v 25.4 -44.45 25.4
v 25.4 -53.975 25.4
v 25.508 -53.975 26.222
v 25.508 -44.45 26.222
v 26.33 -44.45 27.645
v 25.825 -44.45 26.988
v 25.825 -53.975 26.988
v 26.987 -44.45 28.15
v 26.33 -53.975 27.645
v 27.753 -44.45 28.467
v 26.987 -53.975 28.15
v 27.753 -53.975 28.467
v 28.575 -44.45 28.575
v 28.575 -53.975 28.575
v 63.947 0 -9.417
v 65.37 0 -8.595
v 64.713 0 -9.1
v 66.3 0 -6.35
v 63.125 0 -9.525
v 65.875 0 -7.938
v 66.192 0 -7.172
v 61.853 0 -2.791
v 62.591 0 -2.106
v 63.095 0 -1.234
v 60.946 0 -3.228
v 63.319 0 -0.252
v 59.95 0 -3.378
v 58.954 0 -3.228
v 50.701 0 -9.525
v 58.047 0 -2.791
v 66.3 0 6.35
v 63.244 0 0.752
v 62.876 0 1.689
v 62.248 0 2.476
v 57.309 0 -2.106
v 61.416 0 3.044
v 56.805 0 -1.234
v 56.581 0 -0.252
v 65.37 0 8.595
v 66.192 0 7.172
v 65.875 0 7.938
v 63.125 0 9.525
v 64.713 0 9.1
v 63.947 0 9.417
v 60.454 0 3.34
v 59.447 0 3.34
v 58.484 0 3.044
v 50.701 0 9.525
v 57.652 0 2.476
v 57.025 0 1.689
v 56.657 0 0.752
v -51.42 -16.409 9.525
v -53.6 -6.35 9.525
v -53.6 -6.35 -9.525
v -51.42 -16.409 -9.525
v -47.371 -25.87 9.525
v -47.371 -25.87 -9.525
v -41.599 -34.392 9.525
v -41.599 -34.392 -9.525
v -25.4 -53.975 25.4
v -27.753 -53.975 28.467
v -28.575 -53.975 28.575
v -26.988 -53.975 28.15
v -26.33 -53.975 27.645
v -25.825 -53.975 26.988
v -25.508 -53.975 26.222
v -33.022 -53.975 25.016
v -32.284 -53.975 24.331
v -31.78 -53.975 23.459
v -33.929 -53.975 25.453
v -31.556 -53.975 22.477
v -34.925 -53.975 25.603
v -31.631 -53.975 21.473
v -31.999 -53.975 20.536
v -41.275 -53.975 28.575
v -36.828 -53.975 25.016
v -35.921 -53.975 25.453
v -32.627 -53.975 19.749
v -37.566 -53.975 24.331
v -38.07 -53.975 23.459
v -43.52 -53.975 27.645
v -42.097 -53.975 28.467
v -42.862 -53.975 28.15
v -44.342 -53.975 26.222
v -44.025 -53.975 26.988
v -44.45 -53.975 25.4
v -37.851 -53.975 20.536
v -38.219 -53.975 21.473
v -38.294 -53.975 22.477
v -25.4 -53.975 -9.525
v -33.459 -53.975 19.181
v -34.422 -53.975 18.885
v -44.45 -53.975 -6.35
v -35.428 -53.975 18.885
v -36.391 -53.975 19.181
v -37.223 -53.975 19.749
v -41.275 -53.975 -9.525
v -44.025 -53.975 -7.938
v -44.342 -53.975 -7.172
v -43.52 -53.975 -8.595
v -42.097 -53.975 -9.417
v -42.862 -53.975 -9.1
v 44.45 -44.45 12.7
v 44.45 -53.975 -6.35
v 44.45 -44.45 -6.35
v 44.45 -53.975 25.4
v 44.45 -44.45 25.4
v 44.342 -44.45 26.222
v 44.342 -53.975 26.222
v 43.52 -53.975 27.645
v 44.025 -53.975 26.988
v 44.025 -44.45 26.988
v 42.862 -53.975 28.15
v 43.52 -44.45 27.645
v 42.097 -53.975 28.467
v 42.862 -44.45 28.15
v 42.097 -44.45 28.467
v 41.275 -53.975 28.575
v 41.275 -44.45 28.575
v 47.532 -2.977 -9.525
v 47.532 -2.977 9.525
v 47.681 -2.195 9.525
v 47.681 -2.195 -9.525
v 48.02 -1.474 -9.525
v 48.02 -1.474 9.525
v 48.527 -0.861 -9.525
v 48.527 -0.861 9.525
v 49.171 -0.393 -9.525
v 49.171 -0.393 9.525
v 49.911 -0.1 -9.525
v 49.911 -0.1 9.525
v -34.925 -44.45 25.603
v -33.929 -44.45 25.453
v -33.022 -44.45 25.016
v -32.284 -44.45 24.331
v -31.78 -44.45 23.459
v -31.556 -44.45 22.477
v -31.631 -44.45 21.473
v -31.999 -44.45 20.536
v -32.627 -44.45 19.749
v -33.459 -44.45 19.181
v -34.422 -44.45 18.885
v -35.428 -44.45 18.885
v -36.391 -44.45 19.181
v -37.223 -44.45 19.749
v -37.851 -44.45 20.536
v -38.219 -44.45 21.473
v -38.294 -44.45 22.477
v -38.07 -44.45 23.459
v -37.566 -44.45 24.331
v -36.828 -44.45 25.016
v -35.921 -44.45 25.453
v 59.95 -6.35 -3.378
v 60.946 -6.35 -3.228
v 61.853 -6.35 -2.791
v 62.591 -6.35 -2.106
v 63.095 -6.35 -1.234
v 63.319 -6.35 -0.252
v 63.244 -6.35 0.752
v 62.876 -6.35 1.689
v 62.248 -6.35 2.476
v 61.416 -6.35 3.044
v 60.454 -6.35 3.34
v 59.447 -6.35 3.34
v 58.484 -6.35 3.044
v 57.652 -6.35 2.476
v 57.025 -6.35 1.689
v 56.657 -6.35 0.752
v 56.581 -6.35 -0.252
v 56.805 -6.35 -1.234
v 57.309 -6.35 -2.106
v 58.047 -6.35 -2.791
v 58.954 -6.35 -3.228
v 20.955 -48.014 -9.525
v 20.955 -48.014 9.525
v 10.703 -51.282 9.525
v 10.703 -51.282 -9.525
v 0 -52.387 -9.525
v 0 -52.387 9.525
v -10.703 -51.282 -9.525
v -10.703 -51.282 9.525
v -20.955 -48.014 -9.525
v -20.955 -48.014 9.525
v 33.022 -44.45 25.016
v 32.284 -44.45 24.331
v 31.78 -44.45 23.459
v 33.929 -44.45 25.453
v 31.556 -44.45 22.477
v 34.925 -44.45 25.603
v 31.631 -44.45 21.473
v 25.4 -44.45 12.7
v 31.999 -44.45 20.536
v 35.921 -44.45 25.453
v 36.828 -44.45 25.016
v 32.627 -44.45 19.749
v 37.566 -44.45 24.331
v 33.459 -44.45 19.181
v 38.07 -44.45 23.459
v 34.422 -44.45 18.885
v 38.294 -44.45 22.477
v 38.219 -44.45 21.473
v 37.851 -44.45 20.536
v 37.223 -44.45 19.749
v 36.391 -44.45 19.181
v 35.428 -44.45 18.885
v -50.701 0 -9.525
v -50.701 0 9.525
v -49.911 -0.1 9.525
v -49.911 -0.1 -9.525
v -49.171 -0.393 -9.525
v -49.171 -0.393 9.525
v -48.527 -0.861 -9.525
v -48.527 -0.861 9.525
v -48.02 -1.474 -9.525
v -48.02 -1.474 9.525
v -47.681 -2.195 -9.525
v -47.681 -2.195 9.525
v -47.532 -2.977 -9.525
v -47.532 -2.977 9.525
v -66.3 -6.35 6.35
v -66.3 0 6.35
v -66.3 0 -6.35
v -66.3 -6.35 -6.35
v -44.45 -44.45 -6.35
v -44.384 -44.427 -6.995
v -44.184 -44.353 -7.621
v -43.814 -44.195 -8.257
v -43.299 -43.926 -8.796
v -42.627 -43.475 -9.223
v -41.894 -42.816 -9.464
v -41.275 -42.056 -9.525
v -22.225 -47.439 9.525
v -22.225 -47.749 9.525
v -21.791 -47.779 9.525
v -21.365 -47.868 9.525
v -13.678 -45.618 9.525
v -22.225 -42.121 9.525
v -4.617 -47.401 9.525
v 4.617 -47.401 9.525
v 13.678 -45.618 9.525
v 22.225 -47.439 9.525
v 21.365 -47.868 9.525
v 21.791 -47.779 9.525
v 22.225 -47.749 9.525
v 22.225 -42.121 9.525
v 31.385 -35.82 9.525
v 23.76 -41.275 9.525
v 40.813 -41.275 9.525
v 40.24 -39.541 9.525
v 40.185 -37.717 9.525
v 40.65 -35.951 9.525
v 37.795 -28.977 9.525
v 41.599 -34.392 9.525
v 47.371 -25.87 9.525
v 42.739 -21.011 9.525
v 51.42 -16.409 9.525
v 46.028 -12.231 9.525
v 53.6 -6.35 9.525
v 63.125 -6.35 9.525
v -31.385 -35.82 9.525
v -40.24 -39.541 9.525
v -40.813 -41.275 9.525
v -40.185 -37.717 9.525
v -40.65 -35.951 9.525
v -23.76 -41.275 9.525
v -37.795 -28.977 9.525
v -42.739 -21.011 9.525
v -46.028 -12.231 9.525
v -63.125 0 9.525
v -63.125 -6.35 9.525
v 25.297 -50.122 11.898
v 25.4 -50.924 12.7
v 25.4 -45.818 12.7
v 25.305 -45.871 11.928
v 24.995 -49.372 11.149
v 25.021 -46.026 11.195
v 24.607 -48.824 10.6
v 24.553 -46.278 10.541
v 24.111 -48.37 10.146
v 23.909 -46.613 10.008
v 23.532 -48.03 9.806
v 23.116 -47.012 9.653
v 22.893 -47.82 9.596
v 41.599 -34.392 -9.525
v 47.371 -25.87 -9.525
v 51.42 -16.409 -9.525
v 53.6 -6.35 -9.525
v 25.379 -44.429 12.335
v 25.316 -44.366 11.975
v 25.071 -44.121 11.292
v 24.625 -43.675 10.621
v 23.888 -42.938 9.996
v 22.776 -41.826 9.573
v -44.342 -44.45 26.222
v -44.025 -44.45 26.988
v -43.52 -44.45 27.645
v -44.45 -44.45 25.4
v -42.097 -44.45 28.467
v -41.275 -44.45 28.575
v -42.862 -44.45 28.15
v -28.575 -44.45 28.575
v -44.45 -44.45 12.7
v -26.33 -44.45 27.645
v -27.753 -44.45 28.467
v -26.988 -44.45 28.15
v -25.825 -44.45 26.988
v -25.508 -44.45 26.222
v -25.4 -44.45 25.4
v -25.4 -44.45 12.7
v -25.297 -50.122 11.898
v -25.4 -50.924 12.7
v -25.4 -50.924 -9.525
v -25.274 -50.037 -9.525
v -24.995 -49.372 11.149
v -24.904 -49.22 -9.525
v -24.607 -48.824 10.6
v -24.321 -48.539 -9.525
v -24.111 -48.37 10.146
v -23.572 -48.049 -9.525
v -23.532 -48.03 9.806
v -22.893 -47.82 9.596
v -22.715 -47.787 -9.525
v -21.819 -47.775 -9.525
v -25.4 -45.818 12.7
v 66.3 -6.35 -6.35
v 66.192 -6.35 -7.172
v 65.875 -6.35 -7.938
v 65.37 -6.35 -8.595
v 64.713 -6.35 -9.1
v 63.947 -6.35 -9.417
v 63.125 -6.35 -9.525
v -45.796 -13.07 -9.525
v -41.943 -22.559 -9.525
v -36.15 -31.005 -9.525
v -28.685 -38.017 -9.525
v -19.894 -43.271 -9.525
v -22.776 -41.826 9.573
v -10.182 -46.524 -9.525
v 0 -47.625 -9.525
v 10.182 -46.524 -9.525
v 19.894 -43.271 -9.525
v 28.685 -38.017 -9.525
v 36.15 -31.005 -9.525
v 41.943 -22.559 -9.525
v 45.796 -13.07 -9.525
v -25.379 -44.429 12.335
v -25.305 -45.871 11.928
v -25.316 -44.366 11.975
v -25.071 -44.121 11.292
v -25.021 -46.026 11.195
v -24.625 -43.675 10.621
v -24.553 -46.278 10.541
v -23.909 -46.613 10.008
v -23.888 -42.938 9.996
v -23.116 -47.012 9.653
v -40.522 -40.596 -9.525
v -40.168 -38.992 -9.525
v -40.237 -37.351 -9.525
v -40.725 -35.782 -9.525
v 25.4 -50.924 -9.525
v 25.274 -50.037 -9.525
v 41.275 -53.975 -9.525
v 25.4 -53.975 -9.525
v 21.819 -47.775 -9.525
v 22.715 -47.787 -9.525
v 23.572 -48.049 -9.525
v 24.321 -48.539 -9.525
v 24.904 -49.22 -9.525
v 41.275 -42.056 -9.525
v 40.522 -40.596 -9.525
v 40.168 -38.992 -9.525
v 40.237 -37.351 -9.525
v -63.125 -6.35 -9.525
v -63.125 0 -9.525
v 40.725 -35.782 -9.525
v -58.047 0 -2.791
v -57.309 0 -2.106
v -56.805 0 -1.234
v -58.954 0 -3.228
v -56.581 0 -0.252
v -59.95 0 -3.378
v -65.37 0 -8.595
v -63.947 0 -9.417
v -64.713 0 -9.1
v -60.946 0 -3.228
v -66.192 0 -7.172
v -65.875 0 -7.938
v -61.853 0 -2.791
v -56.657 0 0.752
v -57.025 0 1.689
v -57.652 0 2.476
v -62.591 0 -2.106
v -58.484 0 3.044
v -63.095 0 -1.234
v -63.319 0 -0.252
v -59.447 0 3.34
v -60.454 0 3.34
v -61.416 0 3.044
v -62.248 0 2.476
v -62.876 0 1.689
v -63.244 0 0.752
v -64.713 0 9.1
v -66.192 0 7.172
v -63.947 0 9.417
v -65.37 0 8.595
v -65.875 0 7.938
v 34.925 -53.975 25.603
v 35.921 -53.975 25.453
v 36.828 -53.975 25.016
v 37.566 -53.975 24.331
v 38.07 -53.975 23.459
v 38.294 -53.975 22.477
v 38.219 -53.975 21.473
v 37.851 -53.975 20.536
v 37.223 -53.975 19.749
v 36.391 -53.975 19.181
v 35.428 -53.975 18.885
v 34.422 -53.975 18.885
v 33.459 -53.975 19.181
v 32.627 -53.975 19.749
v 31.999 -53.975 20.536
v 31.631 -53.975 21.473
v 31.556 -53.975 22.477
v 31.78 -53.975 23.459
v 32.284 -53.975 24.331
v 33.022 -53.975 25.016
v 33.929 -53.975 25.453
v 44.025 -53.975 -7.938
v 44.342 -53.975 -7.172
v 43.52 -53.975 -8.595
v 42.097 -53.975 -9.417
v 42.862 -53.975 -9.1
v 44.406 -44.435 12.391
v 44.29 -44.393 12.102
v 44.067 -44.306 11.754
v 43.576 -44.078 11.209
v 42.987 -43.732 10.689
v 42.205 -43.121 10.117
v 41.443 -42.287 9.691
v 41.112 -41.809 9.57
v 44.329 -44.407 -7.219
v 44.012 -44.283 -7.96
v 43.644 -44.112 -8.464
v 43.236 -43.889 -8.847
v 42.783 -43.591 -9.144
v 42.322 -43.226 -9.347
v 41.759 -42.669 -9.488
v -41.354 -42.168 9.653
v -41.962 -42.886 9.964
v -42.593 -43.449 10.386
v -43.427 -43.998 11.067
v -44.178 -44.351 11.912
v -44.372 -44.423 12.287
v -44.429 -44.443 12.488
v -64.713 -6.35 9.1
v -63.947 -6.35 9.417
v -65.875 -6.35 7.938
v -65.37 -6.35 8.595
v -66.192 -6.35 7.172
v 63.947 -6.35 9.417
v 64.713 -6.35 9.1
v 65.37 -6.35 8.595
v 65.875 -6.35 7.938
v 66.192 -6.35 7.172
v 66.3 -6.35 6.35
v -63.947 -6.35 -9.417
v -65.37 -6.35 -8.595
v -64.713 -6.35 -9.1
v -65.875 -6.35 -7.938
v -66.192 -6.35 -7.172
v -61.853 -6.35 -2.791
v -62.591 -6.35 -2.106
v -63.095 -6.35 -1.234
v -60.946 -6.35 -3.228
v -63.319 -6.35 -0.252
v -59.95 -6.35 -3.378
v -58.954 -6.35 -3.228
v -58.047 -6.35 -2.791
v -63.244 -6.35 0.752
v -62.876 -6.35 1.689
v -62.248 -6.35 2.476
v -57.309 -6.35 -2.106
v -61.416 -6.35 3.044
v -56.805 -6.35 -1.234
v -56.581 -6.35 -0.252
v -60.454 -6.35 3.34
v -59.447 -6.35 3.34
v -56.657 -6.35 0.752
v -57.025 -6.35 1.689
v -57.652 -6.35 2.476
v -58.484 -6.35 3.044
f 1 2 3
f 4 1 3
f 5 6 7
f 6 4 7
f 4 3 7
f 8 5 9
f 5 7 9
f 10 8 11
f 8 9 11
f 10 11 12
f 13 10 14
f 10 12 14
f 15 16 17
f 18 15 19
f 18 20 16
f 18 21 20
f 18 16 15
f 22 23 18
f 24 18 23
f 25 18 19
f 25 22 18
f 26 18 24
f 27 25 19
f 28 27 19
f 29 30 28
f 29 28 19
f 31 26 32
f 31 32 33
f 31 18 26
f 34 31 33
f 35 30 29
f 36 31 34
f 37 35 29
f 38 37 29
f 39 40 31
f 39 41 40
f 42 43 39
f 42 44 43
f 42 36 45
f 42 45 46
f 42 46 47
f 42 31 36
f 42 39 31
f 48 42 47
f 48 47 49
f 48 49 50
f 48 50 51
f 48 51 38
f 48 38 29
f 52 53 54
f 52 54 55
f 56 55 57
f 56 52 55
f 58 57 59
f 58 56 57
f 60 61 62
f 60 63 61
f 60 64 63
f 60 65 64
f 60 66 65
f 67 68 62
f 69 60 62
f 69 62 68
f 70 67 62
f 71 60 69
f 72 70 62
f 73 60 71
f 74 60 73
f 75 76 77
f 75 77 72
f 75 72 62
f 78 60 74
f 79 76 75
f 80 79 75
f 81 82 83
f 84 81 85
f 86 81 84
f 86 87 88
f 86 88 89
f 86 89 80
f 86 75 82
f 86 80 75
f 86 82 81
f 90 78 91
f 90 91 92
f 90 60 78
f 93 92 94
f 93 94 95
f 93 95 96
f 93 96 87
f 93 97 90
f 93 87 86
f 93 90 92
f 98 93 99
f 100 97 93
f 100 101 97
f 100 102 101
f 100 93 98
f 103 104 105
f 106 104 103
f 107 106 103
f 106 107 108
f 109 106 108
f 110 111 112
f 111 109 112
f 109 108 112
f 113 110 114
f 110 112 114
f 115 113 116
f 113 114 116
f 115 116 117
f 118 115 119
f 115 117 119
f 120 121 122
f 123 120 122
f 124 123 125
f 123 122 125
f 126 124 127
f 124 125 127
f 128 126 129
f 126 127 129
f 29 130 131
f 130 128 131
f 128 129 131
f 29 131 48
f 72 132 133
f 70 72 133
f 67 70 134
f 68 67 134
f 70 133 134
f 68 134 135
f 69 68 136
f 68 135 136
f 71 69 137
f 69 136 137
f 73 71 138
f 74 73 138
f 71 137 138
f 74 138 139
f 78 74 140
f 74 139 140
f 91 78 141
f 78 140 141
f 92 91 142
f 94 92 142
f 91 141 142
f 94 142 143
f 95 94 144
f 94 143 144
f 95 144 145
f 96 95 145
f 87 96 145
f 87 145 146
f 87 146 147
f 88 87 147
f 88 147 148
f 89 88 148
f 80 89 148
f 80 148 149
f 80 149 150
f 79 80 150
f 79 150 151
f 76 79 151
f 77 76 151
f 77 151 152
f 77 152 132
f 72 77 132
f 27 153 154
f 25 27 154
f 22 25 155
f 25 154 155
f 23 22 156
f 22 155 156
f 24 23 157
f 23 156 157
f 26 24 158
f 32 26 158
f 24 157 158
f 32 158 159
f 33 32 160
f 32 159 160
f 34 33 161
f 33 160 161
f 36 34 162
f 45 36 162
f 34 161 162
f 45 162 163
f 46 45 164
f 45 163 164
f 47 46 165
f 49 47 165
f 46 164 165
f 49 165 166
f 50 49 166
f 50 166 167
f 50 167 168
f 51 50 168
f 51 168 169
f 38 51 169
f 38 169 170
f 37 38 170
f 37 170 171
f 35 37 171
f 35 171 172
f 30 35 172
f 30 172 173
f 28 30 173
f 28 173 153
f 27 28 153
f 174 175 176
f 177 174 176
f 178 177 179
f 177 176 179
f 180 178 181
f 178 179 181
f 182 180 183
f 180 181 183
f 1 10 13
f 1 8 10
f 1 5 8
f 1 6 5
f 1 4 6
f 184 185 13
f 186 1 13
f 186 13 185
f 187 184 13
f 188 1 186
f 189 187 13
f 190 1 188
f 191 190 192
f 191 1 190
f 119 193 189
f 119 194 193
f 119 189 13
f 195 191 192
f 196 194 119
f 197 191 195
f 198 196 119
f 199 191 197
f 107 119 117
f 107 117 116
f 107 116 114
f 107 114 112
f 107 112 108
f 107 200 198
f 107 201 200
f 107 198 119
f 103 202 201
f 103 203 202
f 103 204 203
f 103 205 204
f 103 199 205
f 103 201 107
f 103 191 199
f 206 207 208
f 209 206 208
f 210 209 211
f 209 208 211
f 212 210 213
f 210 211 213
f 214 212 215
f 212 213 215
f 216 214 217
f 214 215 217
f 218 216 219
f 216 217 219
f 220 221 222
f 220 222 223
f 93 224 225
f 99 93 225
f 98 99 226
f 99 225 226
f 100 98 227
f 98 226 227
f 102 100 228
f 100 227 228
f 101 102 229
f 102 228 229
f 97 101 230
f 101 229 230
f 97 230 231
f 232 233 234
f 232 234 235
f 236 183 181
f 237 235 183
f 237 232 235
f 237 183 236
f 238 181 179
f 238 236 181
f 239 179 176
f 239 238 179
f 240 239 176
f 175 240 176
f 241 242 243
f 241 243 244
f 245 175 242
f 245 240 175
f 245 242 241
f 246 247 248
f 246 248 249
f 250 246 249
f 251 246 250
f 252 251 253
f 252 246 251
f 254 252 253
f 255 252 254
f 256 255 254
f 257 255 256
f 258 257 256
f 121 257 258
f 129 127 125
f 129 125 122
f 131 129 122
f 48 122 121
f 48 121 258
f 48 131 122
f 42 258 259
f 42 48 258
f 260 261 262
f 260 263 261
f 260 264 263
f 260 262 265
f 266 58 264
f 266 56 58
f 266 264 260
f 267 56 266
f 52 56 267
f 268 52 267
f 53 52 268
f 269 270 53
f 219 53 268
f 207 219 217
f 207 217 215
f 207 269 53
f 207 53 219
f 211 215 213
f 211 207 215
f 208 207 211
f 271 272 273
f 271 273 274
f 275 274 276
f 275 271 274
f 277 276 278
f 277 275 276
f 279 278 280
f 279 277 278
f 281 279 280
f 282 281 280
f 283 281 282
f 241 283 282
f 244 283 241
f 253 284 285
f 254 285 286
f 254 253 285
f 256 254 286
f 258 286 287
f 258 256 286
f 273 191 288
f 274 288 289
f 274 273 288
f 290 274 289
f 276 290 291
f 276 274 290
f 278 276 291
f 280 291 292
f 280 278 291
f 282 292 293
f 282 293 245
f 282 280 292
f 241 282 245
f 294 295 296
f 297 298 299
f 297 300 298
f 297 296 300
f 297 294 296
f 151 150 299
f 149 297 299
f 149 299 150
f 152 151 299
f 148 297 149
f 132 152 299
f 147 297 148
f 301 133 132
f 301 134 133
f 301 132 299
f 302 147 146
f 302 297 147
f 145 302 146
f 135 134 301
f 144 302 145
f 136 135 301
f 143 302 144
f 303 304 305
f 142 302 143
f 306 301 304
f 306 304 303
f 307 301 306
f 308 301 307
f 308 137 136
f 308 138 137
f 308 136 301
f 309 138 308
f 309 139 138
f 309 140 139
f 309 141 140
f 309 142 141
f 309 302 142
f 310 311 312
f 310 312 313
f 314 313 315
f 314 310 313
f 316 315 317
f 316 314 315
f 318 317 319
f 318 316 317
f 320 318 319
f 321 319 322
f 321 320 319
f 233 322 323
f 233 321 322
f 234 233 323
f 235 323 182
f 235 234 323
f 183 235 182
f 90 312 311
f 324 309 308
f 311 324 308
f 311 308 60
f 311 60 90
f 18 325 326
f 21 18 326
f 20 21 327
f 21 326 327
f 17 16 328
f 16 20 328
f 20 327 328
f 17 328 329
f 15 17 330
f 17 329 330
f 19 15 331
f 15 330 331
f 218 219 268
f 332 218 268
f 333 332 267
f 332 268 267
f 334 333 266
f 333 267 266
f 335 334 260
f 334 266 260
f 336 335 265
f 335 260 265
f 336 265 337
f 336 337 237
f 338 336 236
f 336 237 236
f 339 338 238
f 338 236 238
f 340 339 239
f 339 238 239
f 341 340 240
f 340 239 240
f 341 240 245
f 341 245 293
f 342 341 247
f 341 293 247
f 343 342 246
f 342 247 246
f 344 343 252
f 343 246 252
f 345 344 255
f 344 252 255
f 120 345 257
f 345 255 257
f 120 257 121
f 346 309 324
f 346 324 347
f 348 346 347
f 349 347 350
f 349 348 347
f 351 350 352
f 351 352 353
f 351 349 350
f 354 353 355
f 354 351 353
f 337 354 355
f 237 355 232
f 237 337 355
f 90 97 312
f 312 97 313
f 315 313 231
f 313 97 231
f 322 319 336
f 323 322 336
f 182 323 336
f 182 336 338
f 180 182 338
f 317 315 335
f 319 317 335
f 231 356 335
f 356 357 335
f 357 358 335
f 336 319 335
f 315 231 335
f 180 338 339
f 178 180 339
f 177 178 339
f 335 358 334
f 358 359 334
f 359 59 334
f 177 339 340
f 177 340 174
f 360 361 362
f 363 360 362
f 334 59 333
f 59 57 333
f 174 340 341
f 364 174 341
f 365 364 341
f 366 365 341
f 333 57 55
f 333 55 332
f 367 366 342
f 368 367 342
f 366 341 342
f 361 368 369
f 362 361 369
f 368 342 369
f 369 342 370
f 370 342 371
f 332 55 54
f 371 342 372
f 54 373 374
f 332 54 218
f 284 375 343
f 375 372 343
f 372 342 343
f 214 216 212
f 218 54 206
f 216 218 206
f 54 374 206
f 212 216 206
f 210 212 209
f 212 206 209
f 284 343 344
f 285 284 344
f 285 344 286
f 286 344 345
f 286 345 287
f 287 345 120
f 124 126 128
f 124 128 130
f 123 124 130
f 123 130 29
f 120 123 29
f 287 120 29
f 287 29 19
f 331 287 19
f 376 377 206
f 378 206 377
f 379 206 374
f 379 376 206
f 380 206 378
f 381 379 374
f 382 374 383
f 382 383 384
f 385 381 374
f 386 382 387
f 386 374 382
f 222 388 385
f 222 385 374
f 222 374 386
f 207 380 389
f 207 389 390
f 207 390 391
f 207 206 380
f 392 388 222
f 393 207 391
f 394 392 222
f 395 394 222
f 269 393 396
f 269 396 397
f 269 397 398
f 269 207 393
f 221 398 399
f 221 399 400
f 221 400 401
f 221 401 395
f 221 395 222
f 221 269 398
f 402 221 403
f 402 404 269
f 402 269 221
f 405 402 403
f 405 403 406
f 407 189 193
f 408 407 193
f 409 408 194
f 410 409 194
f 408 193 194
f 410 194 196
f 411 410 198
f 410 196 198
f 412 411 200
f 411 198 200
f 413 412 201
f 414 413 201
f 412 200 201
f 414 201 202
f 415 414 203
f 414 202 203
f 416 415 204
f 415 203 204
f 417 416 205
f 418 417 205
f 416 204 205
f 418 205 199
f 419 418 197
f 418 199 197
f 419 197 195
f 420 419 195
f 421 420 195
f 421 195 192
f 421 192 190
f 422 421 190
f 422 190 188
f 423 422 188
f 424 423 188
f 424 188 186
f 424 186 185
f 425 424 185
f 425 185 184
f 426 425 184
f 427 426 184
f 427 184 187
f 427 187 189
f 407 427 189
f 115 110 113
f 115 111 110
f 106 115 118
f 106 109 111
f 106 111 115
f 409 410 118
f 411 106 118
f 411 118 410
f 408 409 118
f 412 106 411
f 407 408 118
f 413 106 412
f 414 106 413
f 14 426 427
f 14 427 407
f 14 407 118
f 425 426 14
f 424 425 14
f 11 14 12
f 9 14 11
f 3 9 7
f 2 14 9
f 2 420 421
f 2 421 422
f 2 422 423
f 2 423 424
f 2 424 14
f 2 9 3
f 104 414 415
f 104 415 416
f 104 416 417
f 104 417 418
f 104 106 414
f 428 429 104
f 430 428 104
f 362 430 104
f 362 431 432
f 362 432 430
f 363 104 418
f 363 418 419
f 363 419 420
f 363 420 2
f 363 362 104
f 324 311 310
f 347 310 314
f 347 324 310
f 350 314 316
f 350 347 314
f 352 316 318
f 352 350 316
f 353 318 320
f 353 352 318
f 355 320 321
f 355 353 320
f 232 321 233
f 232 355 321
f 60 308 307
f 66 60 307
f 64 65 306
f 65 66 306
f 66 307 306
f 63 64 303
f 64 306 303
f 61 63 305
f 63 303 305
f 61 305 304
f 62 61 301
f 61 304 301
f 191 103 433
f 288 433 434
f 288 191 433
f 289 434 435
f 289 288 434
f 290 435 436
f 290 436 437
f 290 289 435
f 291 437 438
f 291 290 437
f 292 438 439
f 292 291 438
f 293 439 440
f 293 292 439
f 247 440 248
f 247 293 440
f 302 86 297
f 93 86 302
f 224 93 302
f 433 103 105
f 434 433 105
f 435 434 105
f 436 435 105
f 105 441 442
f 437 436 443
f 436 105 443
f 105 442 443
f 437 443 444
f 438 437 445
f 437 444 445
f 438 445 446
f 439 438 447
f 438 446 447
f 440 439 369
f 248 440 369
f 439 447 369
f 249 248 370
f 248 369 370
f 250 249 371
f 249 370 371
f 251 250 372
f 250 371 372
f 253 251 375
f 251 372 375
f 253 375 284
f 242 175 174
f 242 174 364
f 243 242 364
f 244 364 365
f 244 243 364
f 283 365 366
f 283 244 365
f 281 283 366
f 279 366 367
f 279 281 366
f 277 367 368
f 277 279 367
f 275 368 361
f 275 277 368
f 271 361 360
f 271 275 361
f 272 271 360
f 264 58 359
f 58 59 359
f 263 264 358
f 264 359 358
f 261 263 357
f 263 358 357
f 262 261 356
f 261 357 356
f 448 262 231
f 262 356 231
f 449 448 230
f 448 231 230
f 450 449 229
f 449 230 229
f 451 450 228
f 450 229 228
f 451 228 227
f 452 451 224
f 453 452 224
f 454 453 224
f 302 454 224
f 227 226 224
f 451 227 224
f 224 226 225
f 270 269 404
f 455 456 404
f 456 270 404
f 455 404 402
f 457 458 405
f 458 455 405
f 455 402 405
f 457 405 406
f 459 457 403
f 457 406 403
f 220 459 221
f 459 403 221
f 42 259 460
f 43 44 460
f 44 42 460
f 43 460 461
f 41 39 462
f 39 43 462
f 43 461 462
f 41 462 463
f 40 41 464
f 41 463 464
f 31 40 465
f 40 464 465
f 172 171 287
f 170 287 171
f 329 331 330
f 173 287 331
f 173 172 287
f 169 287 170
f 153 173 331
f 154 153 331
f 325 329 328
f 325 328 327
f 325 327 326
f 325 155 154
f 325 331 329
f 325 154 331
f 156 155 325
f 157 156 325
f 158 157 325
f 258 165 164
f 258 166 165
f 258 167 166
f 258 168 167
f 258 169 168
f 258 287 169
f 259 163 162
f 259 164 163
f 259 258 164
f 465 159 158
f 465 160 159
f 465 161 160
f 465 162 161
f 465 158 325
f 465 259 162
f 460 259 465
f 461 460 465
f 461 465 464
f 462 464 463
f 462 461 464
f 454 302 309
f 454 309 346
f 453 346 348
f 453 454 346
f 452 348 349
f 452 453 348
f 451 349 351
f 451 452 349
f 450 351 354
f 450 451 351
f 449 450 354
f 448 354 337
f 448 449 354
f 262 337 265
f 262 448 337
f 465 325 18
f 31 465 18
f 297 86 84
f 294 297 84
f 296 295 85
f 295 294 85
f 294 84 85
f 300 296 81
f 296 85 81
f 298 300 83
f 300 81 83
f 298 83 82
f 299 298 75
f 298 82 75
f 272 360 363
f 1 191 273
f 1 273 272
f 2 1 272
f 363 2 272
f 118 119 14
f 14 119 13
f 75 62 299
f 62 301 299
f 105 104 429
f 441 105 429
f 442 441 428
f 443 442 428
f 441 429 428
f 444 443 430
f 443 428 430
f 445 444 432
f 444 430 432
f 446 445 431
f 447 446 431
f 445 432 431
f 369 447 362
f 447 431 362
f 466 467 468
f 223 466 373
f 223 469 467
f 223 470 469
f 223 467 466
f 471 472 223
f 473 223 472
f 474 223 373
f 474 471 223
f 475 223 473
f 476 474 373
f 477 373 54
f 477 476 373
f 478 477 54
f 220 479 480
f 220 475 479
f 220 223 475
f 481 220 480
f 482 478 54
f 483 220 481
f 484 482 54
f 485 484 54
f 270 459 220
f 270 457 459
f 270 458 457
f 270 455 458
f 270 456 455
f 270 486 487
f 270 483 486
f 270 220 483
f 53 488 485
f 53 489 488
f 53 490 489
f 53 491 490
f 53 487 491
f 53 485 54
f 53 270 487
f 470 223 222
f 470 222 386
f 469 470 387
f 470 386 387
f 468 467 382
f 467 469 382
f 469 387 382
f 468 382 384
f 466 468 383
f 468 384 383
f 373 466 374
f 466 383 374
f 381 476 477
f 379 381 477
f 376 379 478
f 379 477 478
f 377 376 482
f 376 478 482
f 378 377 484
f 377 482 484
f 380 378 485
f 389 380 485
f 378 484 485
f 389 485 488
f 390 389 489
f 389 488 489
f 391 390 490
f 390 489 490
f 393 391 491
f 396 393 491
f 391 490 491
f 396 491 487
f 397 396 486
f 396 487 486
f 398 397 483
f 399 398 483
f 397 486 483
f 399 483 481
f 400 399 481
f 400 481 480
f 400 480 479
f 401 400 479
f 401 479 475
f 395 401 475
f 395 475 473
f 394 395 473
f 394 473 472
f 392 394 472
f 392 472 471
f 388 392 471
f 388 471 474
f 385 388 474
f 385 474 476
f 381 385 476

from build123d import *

# Parameters (mm, degrees)
BOSS_EXTRUDE2_DEPTH = 9.525
CUT_EXTRUDE2_REACH  = 84.186
SKETCH5_R           = 3.3782
BOSS_EXTRUDE3_DEPTH = 19.05
CUT_EXTRUDE3_REACH  = 86.782
SKETCH7_R           = 3.3782
CUT_EXTRUDE5_REACH  = 89.589
FILLET3_R           = 6.35
FILLET4_R           = 3.175


with BuildPart() as part:
    # Sketch1 → Boss-Extrude2 (new, symmetric)
    with BuildSketch(Plane.XY):
        with BuildLine():
            Line((-47.62499999999999, 0), (-66.30016907622587, -2.27e-15))
            Line((-66.30016907622587, -2.27e-15), (-66.30016907622587, -6.350000000000002))
            Line((-66.30016907622587, -6.350000000000002), (-53.60016907622586, -6.350000000000002))
            ThreePointArc((-53.60016907622586, -6.350000000000002), (-46.217987777388224, -27.87827524810658), (-30.618591166152626, -44.449999999999996))
            Line((-30.618591166152626, -44.449999999999996), (-44.449999999999996, -44.449999999999996))
            Line((-44.449999999999996, -44.449999999999996), (-44.449999999999996, -53.975))
            Line((-44.449999999999996, -53.975), (44.449999999999996, -53.975))
            Line((44.449999999999996, -53.975), (44.449999999999996, -44.449999999999996))
            Line((44.449999999999996, -44.449999999999996), (30.618591166152626, -44.449999999999996))
            ThreePointArc((30.618591166152626, -44.449999999999996), (46.21798777738823, -27.878275248106572), (53.60016907622586, -6.350000000000002))
            Line((53.60016907622586, -6.350000000000002), (66.30016907622587, -6.350000000000002))
            Line((66.30016907622587, -6.350000000000002), (66.30016907622587, -2.27e-15))
            Line((66.30016907622587, -2.27e-15), (47.62499999999999, 0))
            ThreePointArc((47.62499999999999, 0), (-8.75e-15, -47.62499999999999), (-47.62499999999999, 0))
        make_face()
    extrude(amount=BOSS_EXTRUDE2_DEPTH, both=True)

    # Sketch5 → Cut-Extrude2 (cut, up to next)
    with BuildSketch(Plane.XZ.offset(6.350000000000002), mode=Mode.PRIVATE) as cut_extrude2_sk1:
        with Locations(Location((-59.95016907622586, 0, 0), (0, 0, 270))):
            Circle(SKETCH5_R)
    cut_extrude2_tool1 = extrude(cut_extrude2_sk1.sketch, amount=-CUT_EXTRUDE2_REACH, mode=Mode.PRIVATE) & part.part
    # Sketch5 → Cut-Extrude2 (cut, up to next)
    with BuildSketch(Plane.XZ.offset(6.350000000000002), mode=Mode.PRIVATE) as cut_extrude2_sk2:
        with Locations(Location((59.95016907622586, 0, 0), (0, 0, 270))):
            Circle(SKETCH5_R)
    cut_extrude2_tool2 = extrude(cut_extrude2_sk2.sketch, amount=-CUT_EXTRUDE2_REACH, mode=Mode.PRIVATE) & part.part
    add(cut_extrude2_tool1.solids().sort_by_distance((-59.950169, -6.35, 0))[0], mode=Mode.SUBTRACT)
    add(cut_extrude2_tool2.solids().sort_by_distance((59.950169, -6.35, 0))[0], mode=Mode.SUBTRACT)

    # Sketch6 → Boss-Extrude3 (add)
    with BuildSketch(Plane.XY.offset(9.525)):
        Polygon((-44.449999999999996, -44.449999999999996), (-25.39999999999999, -44.449999999999996), (-25.399999999999995, -53.975), (-44.449999999999996, -53.975), align=None)
        Polygon((44.449999999999996, -53.975), (25.399999999999995, -53.975), (25.39999999999999, -44.449999999999996), (44.449999999999996, -44.449999999999996), align=None)
    extrude(amount=BOSS_EXTRUDE3_DEPTH)

    # Sketch7 → Cut-Extrude3 (cut, up to next)
    with BuildSketch(Plane(origin=(0, -44.449999999999996, 0), x_dir=(1, 0, 0), z_dir=(0, 1, 0)), mode=Mode.PRIVATE) as cut_extrude3_sk1:
        with Locations(Location((-34.925, -22.225, 0), (0, 0, 270))):
            Circle(SKETCH7_R)
    cut_extrude3_tool1 = extrude(cut_extrude3_sk1.sketch, amount=-CUT_EXTRUDE3_REACH, mode=Mode.PRIVATE) & part.part
    # Sketch7 → Cut-Extrude3 (cut, up to next)
    with BuildSketch(Plane(origin=(0, -44.449999999999996, 0), x_dir=(1, 0, 0), z_dir=(0, 1, 0)), mode=Mode.PRIVATE) as cut_extrude3_sk2:
        with Locations(Location((34.925, -22.225, 0), (0, 0, 270))):
            Circle(SKETCH7_R)
    cut_extrude3_tool2 = extrude(cut_extrude3_sk2.sketch, amount=-CUT_EXTRUDE3_REACH, mode=Mode.PRIVATE) & part.part
    add(cut_extrude3_tool1.solids().sort_by_distance((-34.925, -44.45, 22.225))[0], mode=Mode.SUBTRACT)
    add(cut_extrude3_tool2.solids().sort_by_distance((34.925, -44.45, 22.225))[0], mode=Mode.SUBTRACT)

    # Sketch10 → Cut-Extrude5 (cut, up to next)
    with BuildSketch(Plane.XY.offset(9.525), mode=Mode.PRIVATE) as cut_extrude5_sk1:
        with BuildLine():
            Line((-25.4, -45.81801126467626), (-25.399999999999995, -53.975))
            Line((-25.399999999999995, -53.975), (25.399999999999995, -53.975))
            Line((25.399999999999995, -53.975), (25.39999999999999, -45.818011264676265))
            ThreePointArc((25.39999999999999, -45.818011264676265), (3.21e-15, -52.3875), (-25.4, -45.81801126467626))
        make_face()
    cut_extrude5_tool1 = extrude(cut_extrude5_sk1.sketch, amount=-CUT_EXTRUDE5_REACH, mode=Mode.PRIVATE) & part.part
    add(cut_extrude5_tool1.solids().sort_by_distance((-24.885493, -49.896506, 9.525))[0], mode=Mode.SUBTRACT)

    # Fillet3
    # the kernel refuses this fillet: 6.35 mm, written as the material it adds along each edge
    with BuildSketch(Plane(origin=(30.618591166152626, -44.449999999999996, -9.525), x_dir=(1, -5.1e-16, 0), z_dir=(0, 0, 1))) as fillet3_piece_1:
        with BuildLine():
            CenterArc((15.87487517374333, 6.012216339895979), FILLET3_R, 140.4182638704102, 110.80957357767647)
            Line((10.980826085333229, 10.058298830433243), (10.88294510356503, 10.13922048024399))
            ThreePointArc((10.88294510356503, 10.13922048024399), (5.753170572776132, 4.742292284663466), (-0.07204374392036078, 0.10458823529411627))
            Line((-0.07204374392036078, 0.10458823529411627), (7e-17, -0.12700000000000244))
            ThreePointArc((7e-17, -0.12700000000000244), (6.915704416923688, -0.1269999999999989), (13.790539507049452, -0.12024432679791633))
            Line((13.790539507049452, -0.12024432679791633), (13.83140883384737, 0))
        make_face()
    extrude(amount=19.05)
    with BuildSketch(Plane(origin=(-30.618591166152626, -44.45, -9.525), x_dir=(-0.7374035751622449, 0.6754524167829585, 0), z_dir=(0, 0, 1))) as fillet3_piece_2:
        with BuildLine():
            CenterArc((15.767155765377446, 6.2892929785445775), FILLET3_R, 151.26145537711756, 110.80957357767625)
            Line((10.199330323609711, 9.342458524335363), (10.08797381477436, 9.403521835251178))
            ThreePointArc((10.08797381477436, 9.403521835251178), (5.013882704873423, 4.764879516213288), (-0.08578245693143738, 0.0936502540456069))
            Line((-0.08578245693143738, 0.0936502540456069), (0.01751906196152835, -0.1257858595708917))
            ThreePointArc((0.01751906196152835, -0.1257858595708917), (7.445601333650467, 0.3890096823710894), (14.873683605339394, -0.12578585957089045))
            Line((14.873683605339394, -0.12578585957089045), (14.89120266730092, 1.6e-16))
        make_face()
    extrude(amount=19.05)

    # Fillet4
    # the kernel refuses this fillet: 3.175 mm, written as the material it adds along each edge
    with BuildSketch(Plane(origin=(-44.45000000000031, -44.44999999999735, 9.525), x_dir=(1.3875e-13, 1, -5.6e-16), z_dir=(1, -1.3875e-13, 0))) as fillet4_piece_1_section:
        with BuildLine():
            CenterArc((FILLET4_R, FILLET4_R), FILLET4_R, 180.00000000000003, 90)
            Line((-8.88e-15, FILLET4_R), (0, 0))
            Line((0, 0), (FILLET4_R, 0))
        make_face()
    fillet4_piece_1 = extrude(amount=19.050000000000317, mode=Mode.PRIVATE)
    fillet4_piece_1 = fillet4_piece_1 - Plane(origin=(-46.493466339895136, -38.43778366010152, 10.266773155518875), x_dir=(-0.7374035751621124, 0.6754524167831031, 0), z_dir=(0, 0, -1)) * Cylinder(6.35, 51, mode=Mode.PRIVATE)
    add(fillet4_piece_1)
    with BuildSketch(Plane(origin=(25.39999999999999, -44.449999999999996, 9.525), x_dir=(-7.5e-16, 1, -5.6e-16), z_dir=(1, 7.5e-16, 0))) as fillet4_piece_2_section:
        with BuildLine():
            CenterArc((FILLET4_R, FILLET4_R), FILLET4_R, 180.00000000000003, 90)
            Line((-8.88e-15, FILLET4_R), (0, 0))
            Line((0, 0), (FILLET4_R, 0))
        make_face()
    fillet4_piece_2 = extrude(amount=19.049999999999997, mode=Mode.PRIVATE)
    fillet4_piece_2 = fillet4_piece_2 - Plane(origin=(46.493466339896, -38.437783660104, 10.26677297379504), x_dir=(1, 0, 0), z_dir=(0, 0, -1)) * Cylinder(6.35, 51, mode=Mode.PRIVATE)
    add(fillet4_piece_2)
    with BuildSketch(Plane(origin=(25.399999999999984, -53.75551126467627, 9.525), x_dir=(-1, -3.7e-16, -5.6e-16), z_dir=(-3.7e-16, 1, 0))) as fillet4_piece_3_section:
        with BuildLine():
            CenterArc((FILLET4_R, FILLET4_R), FILLET4_R, 180.00000000000003, 90)
            Line((-5.33e-15, FILLET4_R), (0, 0))
            Line((0, 0), (FILLET4_R, 0))
        make_face()
    fillet4_piece_3 = extrude(amount=9.305511264676277, mode=Mode.PRIVATE)
    fillet4_piece_3 = fillet4_piece_3 & Plane(origin=(4.44e-15, 3.553e-14, 10.160375888913034), x_dir=(0.4848484848484843, -0.8745981630098072, 0), z_dir=(0, 0, 1)) * Cylinder(52.387500000000024, 32, mode=Mode.PRIVATE)
    add(fillet4_piece_3)
    with BuildSketch(Plane(origin=(-25.39999999999999, -44.449999999999996, 9.525), x_dir=(1, -3.7e-16, -5.6e-16), z_dir=(-3.7e-16, -1, 0))) as fillet4_piece_4_section:
        with BuildLine():
            CenterArc((FILLET4_R, FILLET4_R), FILLET4_R, 180.00000000000003, 90)
            Line((-5.33e-15, FILLET4_R), (0, 0))
            Line((0, 0), (FILLET4_R, 0))
        make_face()
    fillet4_piece_4 = extrude(amount=9.305511264676262, mode=Mode.PRIVATE)
    fillet4_piece_4 = fillet4_piece_4 & Plane(origin=(4.44e-15, 3.553e-14, 10.160372154025156), x_dir=(0.4848484848484843, -0.8745981630098072, 0), z_dir=(0, 0, 1)) * Cylinder(52.387500000000024, 32, mode=Mode.PRIVATE)
    add(fillet4_piece_4)
    with BuildSketch(Plane(origin=(-25.4, -45.81801126467626, 9.525), x_dir=(7e-16, -1, 0), z_dir=(0, 0, -1))) as fillet4_piece_5:
        with BuildLine():
            CenterArc((5.1058611455205085, -3.1750000000000007), FILLET4_R, 90.00000000000004, 113.57817847820172)
            ThreePointArc((2.1959255792235512, -4.444999999999995), (1.1505753407627795, -2.196508268422785), (0, 0))
            Line((0, 0), (5.105861145520507, 0))
        make_face()
    extrude(amount=19.05)
    with BuildSketch(Plane(origin=(25.39999999999999, -45.81801126467626, 9.525), x_dir=(-0.8965609468945661, -0.44292038619092594, 0), z_dir=(0, 0, -1))) as fillet4_piece_6:
        with BuildLine():
            CenterArc((5.108070996801428, -3.1714434771838524), FILLET4_R, 92.71218377423436, 113.57817847820183)
            Line((2.26148999041118, -4.577715703340043), (0, 0))
            ThreePointArc((0, 0), (2.4789168072712826, -0.05868262646643985), (4.957833614542567, -4e-17))
        make_face()
    extrude(amount=19.05)
    with BuildSketch(Plane(origin=(-44.45000000000031, -44.44999999999735, 9.525), x_dir=(1.3875e-13, 1, -5.6e-16), z_dir=(1, -1.3875e-13, 0))) as fillet4_piece_7a_section:
        with BuildLine():
            CenterArc((FILLET4_R, FILLET4_R), FILLET4_R, 180.00000000000003, 90)
            Line((-8.88e-15, FILLET4_R), (0, 0))
            Line((0, 0), (FILLET4_R, 0))
        make_face()
    fillet4_piece_7a = extrude(amount=26.987500000000313, mode=Mode.PRIVATE)
    fillet4_piece_7a = fillet4_piece_7a - Plane(origin=(-1.78e-15, -1.78e-15, 10.332620493512062), x_dir=(1, 4e-17, 0), z_dir=(0, 0, 1)) * Cylinder(47.62499999999999, 67, mode=Mode.PRIVATE)
    fillet4_piece_7a = split(fillet4_piece_7a, bisect_by=Plane(origin=(-25.4, -43.88290826667805, 10.332620493512062), z_dir=(1, 4.4e-16, 0)), keep=Keep.TOP, mode=Mode.PRIVATE)
    with BuildSketch(Plane(origin=(-25.400000000000002, -36.512499999999996, 9.525), x_dir=(1, -3.7e-16, -5.6e-16), z_dir=(-3.7e-16, -1, 0))) as fillet4_piece_7b_section:
        with BuildLine():
            CenterArc((FILLET4_R, FILLET4_R), FILLET4_R, 180.00000000000003, 90)
            Line((-1.78e-15, FILLET4_R), (0, 0))
            Line((0, 0), (FILLET4_R, 0))
        make_face()
    fillet4_piece_7b = extrude(amount=17.243011264676262, mode=Mode.PRIVATE)
    fillet4_piece_7b = fillet4_piece_7b - Plane(origin=(-1.78e-15, -1.78e-15, 10.288288962846478), x_dir=(1, 4e-17, 0), z_dir=(0, 0, 1)) * Cylinder(47.62499999999999, 48, mode=Mode.PRIVATE)
    fillet4_piece_7b = split(fillet4_piece_7b, bisect_by=Plane(origin=(-24.755790734076196, -44.449999999999996, 10.288288962846478), z_dir=(0, 1, 0)), keep=Keep.TOP, mode=Mode.PRIVATE)
    fillet4_piece_7 = fillet4_piece_7a & fillet4_piece_7b
    add(fillet4_piece_7)
    with BuildSketch(Plane(origin=(17.46249999999999, -44.44999999999999, 9.525), x_dir=(-7.5e-16, 1, -5.6e-16), z_dir=(1, 7.5e-16, 0))) as fillet4_piece_8a_section:
        with BuildLine():
            CenterArc((FILLET4_R, FILLET4_R), FILLET4_R, 180.00000000000003, 90)
            Line((-1.78e-15, FILLET4_R), (0, 0))
            Line((0, 0), (FILLET4_R, 0))
        make_face()
    fillet4_piece_8a = extrude(amount=26.987499999999994, mode=Mode.PRIVATE)
    fillet4_piece_8a = fillet4_piece_8a - Plane(origin=(-1.78e-15, -1.78e-15, 10.33262094142748), x_dir=(1, 4e-17, 0), z_dir=(0, 0, 1)) * Cylinder(47.62499999999999, 67, mode=Mode.PRIVATE)
    fillet4_piece_8a = split(fillet4_piece_8a, bisect_by=Plane(origin=(25.39999999999999, -43.882907820027945, 10.33262094142748), z_dir=(-1, -4.4e-16, 0)), keep=Keep.TOP, mode=Mode.PRIVATE)
    with BuildSketch(Plane(origin=(25.399999999999984, -53.75551126467627, 9.525), x_dir=(-1, -3.7e-16, -5.6e-16), z_dir=(-3.7e-16, 1, 0))) as fillet4_piece_8b_section:
        with BuildLine():
            CenterArc((FILLET4_R, FILLET4_R), FILLET4_R, 180.00000000000003, 90)
            Line((-5.33e-15, FILLET4_R), (0, 0))
            Line((0, 0), (FILLET4_R, 0))
        make_face()
    fillet4_piece_8b = extrude(amount=17.243011264676284, mode=Mode.PRIVATE)
    fillet4_piece_8b = fillet4_piece_8b - Plane(origin=(-1.78e-15, -1.78e-15, 10.28828876878144), x_dir=(1, 4e-17, 0), z_dir=(0, 0, 1)) * Cylinder(47.62499999999999, 48, mode=Mode.PRIVATE)
    fillet4_piece_8b = split(fillet4_piece_8b, bisect_by=Plane(origin=(24.755792568024695, -44.449999999999996, 10.28828876878144), z_dir=(0, 1, 0)), keep=Keep.TOP, mode=Mode.PRIVATE)
    fillet4_piece_8 = fillet4_piece_8a & fillet4_piece_8b
    add(fillet4_piece_8)
    with BuildSketch(Plane(origin=(25.399999999999984, -53.75551126467627, 9.525), x_dir=(-1, -3.7e-16, -5.6e-16), z_dir=(-3.7e-16, 1, 0))) as fillet4_piece_9a_section:
        with BuildLine():
            CenterArc((FILLET4_R, FILLET4_R), FILLET4_R, 180.00000000000003, 90)
            Line((-5.33e-15, FILLET4_R), (0, 0))
            Line((0, 0), (FILLET4_R, 0))
        make_face()
    fillet4_piece_9a = extrude(amount=9.305511264676277, mode=Mode.PRIVATE)
    fillet4_piece_9a = fillet4_piece_9a - Plane(origin=(4.44e-15, 3.553e-14, 10.263166034588224), x_dir=(0.4848484848484843, -0.8745981630098072, 0), z_dir=(0, 0, 1)) * Cylinder(52.387500000000024, 32, mode=Mode.PRIVATE)
    with BuildSketch(Plane(origin=(25.39999999999999, -45.81801126467626, 22.289652863801265), x_dir=(-0.8965609468945661, -0.44292038619092594, 0), z_dir=(0, 0, -1))) as fillet4_piece_9b_section:
        with BuildLine():
            CenterArc((5.108070996801428, -3.1714434771838524), FILLET4_R, 92.71218377423436, 113.57817847820183)
            Line((2.26148999041118, -4.577715703340043), (0, 0))
            ThreePointArc((0, 0), (2.4789168072712826, -0.05868262646643985), (4.957833614542567, -4e-17))
        make_face()
    fillet4_piece_9b = extrude(amount=31.814652863801264, mode=Mode.PRIVATE)
    fillet4_piece_9b = split(fillet4_piece_9b, bisect_by=Plane(origin=(24.331684208518332, -47.62488744049409, 9.525), z_dir=(0, 0, 1)), keep=Keep.TOP, mode=Mode.PRIVATE)
    fillet4_piece_9 = fillet4_piece_9a & fillet4_piece_9b
    add(fillet4_piece_9)
    with BuildSketch(Plane(origin=(-25.39999999999999, -44.449999999999996, 9.525), x_dir=(1, -3.7e-16, -5.6e-16), z_dir=(-3.7e-16, -1, 0))) as fillet4_piece_10a_section:
        with BuildLine():
            CenterArc((FILLET4_R, FILLET4_R), FILLET4_R, 180.00000000000003, 90)
            Line((-5.33e-15, FILLET4_R), (0, 0))
            Line((0, 0), (FILLET4_R, 0))
        make_face()
    fillet4_piece_10a = extrude(amount=9.305511264676262, mode=Mode.PRIVATE)
    fillet4_piece_10a = fillet4_piece_10a - Plane(origin=(4.44e-15, 3.553e-14, 10.263163738620651), x_dir=(0.4848484848484843, -0.8745981630098072, 0), z_dir=(0, 0, 1)) * Cylinder(52.387500000000024, 32, mode=Mode.PRIVATE)
    with BuildSketch(Plane(origin=(-25.4, -45.81801126467625, 22.289652863801265), x_dir=(7e-16, -1, 0), z_dir=(0, 0, -1))) as fillet4_piece_10b_section:
        with BuildLine():
            CenterArc((5.105861145520516, -3.1750000000000007), FILLET4_R, 90.00000000000004, 113.57817847820172)
            ThreePointArc((2.1959255792235584, -4.444999999999995), (1.1505753407627866, -2.196508268422785), (0, 0))
            Line((0, 0), (5.105861145520514, 0))
        make_face()
    fillet4_piece_10b = extrude(amount=31.814652863801264, mode=Mode.PRIVATE)
    fillet4_piece_10b = split(fillet4_piece_10b, bisect_by=Plane(origin=(-24.331684208518332, -47.624887440494085, 9.525), z_dir=(0, 0, 1)), keep=Keep.TOP, mode=Mode.PRIVATE)
    fillet4_piece_10 = fillet4_piece_10a & fillet4_piece_10b
    add(fillet4_piece_10)
    # the kernel refuses this fillet: 3.175 mm, written as the material it takes off along each edge
    with BuildSketch(Plane(origin=(-66.30016907622587, 7.937499999999994, 9.525), x_dir=(0, 0, -1), z_dir=(0, -1, 0))) as fillet4_2_piece_1:
        with BuildLine():
            CenterArc((FILLET4_R, FILLET4_R), FILLET4_R, 180, 90)
            Line((-1.78e-15, FILLET4_R), (0, 0))
            Line((0, 0), (FILLET4_R, 0))
        make_face()
    extrude(amount=22.22499999999999, mode=Mode.SUBTRACT)
    with BuildSketch(Plane(origin=(66.30016907622587, -14.287500000000016, -9.525), x_dir=(-1, 0, 0), z_dir=(0, 1, 0)), Plane(origin=(-66.30016907622587, 7.937499999999986, -9.525), x_dir=(1, 0, 0), z_dir=(0, -1, 0))) as fillet4_2_piece_2:
        with BuildLine():
            CenterArc((FILLET4_R, FILLET4_R), FILLET4_R, 180, 90)
            Line((0, FILLET4_R), (0, 0))
            Line((0, 0), (FILLET4_R, 0))
        make_face()
    extrude(amount=22.22499999999999, mode=Mode.SUBTRACT)
    with BuildSketch(Plane(origin=(44.449999999999996, -61.912499999999994, -9.525), x_dir=(-1, 0, 0), z_dir=(0, 1, 0))) as fillet4_2_piece_3:
        with BuildLine():
            CenterArc((FILLET4_R, FILLET4_R), FILLET4_R, 180, 90)
            Line((0, FILLET4_R), (0, 0))
            Line((0, 0), (FILLET4_R, 0))
        make_face()
    extrude(amount=25.4, mode=Mode.SUBTRACT)
    with BuildSketch(Plane(origin=(-44.449999999999996, -36.512499999999996, -9.525), x_dir=(1, 0, 0), z_dir=(0, -1, 0))) as fillet4_2_piece_4:
        with BuildLine():
            CenterArc((FILLET4_R, FILLET4_R), FILLET4_R, 180, 90)
            Line((-7.11e-15, FILLET4_R), (0, 0))
            Line((0, 0), (FILLET4_R, 0))
        make_face()
    extrude(amount=25.4, mode=Mode.SUBTRACT)
    with BuildSketch(Plane(origin=(47.62499999999999, 0, 17.21421041746987), x_dir=(1, -1.4e-16, 0), z_dir=(0, 0, -1))) as fillet4_2_piece_5:
        with BuildLine():
            CenterArc((3.075684166987948, 3.175), FILLET4_R, 183.58332169847216, 86.41667830152784)
            ThreePointArc((-0.0931085934483913, 2.976562499999989), (-0.02328283960383693, 1.4890091946139992), (0, 0))
            Line((0, 0), (3.0756841669879478, 0))
        make_face()
    extrude(amount=34.42842083493974, mode=Mode.SUBTRACT)
    with BuildSketch(Plane(origin=(-47.62499999999999, -9.39e-15, 17.21421041747397), x_dir=(0.03126528492627727, -0.9995111214781347, 0), z_dir=(0, 0, -1))) as fillet4_2_piece_6:
        with BuildLine():
            CenterArc((3.0772856688687185, 3.173447810693077), FILLET4_R, 181.79166084908871, 86.41667830167557)
            Line((-0.09616214182461408, 3.074180531060293), (0, 0))
            ThreePointArc((0, 0), (1.4890091946139077, 0.02328283960383078), (2.978018389227795, 0))
        make_face()
    extrude(amount=34.42842083494794, mode=Mode.SUBTRACT)
    with BuildSketch(Plane(origin=(-44.449999999999996, -61.9125, 28.575000000000003), x_dir=(1, 0, 0), z_dir=(0, 1, 0)), Plane(origin=(44.449999999999996, -36.512499999999996, 28.575000000000003), x_dir=(-1, 0, 0), z_dir=(0, -1, 0))) as fillet4_2_piece_7:
        with BuildLine():
            CenterArc((FILLET4_R, FILLET4_R), FILLET4_R, 180, 90)
            Line((0, FILLET4_R), (0, 0))
            Line((0, 0), (FILLET4_R, 0))
        make_face()
    extrude(amount=25.400000000000013, mode=Mode.SUBTRACT)
    with BuildSketch(Plane(origin=(-25.400000000000002, -36.512499999999996, 28.575000000000003), x_dir=(-1, 3.7e-16, 0), z_dir=(-3.7e-16, -1, 0)), Plane(origin=(25.4, -61.9125, 28.575000000000003), x_dir=(1, 3.7e-16, 0), z_dir=(-3.7e-16, 1, 0))) as fillet4_2_piece_8:
        with BuildLine():
            CenterArc((FILLET4_R, FILLET4_R), FILLET4_R, 180, 90)
            Line((0, FILLET4_R), (0, 0))
            Line((0, 0), (FILLET4_R, 0))
        make_face()
    extrude(amount=25.400000000000013, mode=Mode.SUBTRACT)
    with BuildSketch(Plane(origin=(66.30016907622587, -14.287500000000016, 9.525), x_dir=(-1, 0, 0), z_dir=(0, 1, 0))) as fillet4_2_piece_9:
        with BuildLine():
            CenterArc((FILLET4_R, -FILLET4_R), FILLET4_R, 90, 90)
            Line((0, -FILLET4_R), (0, 0))
            Line((0, 0), (FILLET4_R, 0))
        make_face()
    extrude(amount=22.22499999999999, mode=Mode.SUBTRACT)


solid = part.part
